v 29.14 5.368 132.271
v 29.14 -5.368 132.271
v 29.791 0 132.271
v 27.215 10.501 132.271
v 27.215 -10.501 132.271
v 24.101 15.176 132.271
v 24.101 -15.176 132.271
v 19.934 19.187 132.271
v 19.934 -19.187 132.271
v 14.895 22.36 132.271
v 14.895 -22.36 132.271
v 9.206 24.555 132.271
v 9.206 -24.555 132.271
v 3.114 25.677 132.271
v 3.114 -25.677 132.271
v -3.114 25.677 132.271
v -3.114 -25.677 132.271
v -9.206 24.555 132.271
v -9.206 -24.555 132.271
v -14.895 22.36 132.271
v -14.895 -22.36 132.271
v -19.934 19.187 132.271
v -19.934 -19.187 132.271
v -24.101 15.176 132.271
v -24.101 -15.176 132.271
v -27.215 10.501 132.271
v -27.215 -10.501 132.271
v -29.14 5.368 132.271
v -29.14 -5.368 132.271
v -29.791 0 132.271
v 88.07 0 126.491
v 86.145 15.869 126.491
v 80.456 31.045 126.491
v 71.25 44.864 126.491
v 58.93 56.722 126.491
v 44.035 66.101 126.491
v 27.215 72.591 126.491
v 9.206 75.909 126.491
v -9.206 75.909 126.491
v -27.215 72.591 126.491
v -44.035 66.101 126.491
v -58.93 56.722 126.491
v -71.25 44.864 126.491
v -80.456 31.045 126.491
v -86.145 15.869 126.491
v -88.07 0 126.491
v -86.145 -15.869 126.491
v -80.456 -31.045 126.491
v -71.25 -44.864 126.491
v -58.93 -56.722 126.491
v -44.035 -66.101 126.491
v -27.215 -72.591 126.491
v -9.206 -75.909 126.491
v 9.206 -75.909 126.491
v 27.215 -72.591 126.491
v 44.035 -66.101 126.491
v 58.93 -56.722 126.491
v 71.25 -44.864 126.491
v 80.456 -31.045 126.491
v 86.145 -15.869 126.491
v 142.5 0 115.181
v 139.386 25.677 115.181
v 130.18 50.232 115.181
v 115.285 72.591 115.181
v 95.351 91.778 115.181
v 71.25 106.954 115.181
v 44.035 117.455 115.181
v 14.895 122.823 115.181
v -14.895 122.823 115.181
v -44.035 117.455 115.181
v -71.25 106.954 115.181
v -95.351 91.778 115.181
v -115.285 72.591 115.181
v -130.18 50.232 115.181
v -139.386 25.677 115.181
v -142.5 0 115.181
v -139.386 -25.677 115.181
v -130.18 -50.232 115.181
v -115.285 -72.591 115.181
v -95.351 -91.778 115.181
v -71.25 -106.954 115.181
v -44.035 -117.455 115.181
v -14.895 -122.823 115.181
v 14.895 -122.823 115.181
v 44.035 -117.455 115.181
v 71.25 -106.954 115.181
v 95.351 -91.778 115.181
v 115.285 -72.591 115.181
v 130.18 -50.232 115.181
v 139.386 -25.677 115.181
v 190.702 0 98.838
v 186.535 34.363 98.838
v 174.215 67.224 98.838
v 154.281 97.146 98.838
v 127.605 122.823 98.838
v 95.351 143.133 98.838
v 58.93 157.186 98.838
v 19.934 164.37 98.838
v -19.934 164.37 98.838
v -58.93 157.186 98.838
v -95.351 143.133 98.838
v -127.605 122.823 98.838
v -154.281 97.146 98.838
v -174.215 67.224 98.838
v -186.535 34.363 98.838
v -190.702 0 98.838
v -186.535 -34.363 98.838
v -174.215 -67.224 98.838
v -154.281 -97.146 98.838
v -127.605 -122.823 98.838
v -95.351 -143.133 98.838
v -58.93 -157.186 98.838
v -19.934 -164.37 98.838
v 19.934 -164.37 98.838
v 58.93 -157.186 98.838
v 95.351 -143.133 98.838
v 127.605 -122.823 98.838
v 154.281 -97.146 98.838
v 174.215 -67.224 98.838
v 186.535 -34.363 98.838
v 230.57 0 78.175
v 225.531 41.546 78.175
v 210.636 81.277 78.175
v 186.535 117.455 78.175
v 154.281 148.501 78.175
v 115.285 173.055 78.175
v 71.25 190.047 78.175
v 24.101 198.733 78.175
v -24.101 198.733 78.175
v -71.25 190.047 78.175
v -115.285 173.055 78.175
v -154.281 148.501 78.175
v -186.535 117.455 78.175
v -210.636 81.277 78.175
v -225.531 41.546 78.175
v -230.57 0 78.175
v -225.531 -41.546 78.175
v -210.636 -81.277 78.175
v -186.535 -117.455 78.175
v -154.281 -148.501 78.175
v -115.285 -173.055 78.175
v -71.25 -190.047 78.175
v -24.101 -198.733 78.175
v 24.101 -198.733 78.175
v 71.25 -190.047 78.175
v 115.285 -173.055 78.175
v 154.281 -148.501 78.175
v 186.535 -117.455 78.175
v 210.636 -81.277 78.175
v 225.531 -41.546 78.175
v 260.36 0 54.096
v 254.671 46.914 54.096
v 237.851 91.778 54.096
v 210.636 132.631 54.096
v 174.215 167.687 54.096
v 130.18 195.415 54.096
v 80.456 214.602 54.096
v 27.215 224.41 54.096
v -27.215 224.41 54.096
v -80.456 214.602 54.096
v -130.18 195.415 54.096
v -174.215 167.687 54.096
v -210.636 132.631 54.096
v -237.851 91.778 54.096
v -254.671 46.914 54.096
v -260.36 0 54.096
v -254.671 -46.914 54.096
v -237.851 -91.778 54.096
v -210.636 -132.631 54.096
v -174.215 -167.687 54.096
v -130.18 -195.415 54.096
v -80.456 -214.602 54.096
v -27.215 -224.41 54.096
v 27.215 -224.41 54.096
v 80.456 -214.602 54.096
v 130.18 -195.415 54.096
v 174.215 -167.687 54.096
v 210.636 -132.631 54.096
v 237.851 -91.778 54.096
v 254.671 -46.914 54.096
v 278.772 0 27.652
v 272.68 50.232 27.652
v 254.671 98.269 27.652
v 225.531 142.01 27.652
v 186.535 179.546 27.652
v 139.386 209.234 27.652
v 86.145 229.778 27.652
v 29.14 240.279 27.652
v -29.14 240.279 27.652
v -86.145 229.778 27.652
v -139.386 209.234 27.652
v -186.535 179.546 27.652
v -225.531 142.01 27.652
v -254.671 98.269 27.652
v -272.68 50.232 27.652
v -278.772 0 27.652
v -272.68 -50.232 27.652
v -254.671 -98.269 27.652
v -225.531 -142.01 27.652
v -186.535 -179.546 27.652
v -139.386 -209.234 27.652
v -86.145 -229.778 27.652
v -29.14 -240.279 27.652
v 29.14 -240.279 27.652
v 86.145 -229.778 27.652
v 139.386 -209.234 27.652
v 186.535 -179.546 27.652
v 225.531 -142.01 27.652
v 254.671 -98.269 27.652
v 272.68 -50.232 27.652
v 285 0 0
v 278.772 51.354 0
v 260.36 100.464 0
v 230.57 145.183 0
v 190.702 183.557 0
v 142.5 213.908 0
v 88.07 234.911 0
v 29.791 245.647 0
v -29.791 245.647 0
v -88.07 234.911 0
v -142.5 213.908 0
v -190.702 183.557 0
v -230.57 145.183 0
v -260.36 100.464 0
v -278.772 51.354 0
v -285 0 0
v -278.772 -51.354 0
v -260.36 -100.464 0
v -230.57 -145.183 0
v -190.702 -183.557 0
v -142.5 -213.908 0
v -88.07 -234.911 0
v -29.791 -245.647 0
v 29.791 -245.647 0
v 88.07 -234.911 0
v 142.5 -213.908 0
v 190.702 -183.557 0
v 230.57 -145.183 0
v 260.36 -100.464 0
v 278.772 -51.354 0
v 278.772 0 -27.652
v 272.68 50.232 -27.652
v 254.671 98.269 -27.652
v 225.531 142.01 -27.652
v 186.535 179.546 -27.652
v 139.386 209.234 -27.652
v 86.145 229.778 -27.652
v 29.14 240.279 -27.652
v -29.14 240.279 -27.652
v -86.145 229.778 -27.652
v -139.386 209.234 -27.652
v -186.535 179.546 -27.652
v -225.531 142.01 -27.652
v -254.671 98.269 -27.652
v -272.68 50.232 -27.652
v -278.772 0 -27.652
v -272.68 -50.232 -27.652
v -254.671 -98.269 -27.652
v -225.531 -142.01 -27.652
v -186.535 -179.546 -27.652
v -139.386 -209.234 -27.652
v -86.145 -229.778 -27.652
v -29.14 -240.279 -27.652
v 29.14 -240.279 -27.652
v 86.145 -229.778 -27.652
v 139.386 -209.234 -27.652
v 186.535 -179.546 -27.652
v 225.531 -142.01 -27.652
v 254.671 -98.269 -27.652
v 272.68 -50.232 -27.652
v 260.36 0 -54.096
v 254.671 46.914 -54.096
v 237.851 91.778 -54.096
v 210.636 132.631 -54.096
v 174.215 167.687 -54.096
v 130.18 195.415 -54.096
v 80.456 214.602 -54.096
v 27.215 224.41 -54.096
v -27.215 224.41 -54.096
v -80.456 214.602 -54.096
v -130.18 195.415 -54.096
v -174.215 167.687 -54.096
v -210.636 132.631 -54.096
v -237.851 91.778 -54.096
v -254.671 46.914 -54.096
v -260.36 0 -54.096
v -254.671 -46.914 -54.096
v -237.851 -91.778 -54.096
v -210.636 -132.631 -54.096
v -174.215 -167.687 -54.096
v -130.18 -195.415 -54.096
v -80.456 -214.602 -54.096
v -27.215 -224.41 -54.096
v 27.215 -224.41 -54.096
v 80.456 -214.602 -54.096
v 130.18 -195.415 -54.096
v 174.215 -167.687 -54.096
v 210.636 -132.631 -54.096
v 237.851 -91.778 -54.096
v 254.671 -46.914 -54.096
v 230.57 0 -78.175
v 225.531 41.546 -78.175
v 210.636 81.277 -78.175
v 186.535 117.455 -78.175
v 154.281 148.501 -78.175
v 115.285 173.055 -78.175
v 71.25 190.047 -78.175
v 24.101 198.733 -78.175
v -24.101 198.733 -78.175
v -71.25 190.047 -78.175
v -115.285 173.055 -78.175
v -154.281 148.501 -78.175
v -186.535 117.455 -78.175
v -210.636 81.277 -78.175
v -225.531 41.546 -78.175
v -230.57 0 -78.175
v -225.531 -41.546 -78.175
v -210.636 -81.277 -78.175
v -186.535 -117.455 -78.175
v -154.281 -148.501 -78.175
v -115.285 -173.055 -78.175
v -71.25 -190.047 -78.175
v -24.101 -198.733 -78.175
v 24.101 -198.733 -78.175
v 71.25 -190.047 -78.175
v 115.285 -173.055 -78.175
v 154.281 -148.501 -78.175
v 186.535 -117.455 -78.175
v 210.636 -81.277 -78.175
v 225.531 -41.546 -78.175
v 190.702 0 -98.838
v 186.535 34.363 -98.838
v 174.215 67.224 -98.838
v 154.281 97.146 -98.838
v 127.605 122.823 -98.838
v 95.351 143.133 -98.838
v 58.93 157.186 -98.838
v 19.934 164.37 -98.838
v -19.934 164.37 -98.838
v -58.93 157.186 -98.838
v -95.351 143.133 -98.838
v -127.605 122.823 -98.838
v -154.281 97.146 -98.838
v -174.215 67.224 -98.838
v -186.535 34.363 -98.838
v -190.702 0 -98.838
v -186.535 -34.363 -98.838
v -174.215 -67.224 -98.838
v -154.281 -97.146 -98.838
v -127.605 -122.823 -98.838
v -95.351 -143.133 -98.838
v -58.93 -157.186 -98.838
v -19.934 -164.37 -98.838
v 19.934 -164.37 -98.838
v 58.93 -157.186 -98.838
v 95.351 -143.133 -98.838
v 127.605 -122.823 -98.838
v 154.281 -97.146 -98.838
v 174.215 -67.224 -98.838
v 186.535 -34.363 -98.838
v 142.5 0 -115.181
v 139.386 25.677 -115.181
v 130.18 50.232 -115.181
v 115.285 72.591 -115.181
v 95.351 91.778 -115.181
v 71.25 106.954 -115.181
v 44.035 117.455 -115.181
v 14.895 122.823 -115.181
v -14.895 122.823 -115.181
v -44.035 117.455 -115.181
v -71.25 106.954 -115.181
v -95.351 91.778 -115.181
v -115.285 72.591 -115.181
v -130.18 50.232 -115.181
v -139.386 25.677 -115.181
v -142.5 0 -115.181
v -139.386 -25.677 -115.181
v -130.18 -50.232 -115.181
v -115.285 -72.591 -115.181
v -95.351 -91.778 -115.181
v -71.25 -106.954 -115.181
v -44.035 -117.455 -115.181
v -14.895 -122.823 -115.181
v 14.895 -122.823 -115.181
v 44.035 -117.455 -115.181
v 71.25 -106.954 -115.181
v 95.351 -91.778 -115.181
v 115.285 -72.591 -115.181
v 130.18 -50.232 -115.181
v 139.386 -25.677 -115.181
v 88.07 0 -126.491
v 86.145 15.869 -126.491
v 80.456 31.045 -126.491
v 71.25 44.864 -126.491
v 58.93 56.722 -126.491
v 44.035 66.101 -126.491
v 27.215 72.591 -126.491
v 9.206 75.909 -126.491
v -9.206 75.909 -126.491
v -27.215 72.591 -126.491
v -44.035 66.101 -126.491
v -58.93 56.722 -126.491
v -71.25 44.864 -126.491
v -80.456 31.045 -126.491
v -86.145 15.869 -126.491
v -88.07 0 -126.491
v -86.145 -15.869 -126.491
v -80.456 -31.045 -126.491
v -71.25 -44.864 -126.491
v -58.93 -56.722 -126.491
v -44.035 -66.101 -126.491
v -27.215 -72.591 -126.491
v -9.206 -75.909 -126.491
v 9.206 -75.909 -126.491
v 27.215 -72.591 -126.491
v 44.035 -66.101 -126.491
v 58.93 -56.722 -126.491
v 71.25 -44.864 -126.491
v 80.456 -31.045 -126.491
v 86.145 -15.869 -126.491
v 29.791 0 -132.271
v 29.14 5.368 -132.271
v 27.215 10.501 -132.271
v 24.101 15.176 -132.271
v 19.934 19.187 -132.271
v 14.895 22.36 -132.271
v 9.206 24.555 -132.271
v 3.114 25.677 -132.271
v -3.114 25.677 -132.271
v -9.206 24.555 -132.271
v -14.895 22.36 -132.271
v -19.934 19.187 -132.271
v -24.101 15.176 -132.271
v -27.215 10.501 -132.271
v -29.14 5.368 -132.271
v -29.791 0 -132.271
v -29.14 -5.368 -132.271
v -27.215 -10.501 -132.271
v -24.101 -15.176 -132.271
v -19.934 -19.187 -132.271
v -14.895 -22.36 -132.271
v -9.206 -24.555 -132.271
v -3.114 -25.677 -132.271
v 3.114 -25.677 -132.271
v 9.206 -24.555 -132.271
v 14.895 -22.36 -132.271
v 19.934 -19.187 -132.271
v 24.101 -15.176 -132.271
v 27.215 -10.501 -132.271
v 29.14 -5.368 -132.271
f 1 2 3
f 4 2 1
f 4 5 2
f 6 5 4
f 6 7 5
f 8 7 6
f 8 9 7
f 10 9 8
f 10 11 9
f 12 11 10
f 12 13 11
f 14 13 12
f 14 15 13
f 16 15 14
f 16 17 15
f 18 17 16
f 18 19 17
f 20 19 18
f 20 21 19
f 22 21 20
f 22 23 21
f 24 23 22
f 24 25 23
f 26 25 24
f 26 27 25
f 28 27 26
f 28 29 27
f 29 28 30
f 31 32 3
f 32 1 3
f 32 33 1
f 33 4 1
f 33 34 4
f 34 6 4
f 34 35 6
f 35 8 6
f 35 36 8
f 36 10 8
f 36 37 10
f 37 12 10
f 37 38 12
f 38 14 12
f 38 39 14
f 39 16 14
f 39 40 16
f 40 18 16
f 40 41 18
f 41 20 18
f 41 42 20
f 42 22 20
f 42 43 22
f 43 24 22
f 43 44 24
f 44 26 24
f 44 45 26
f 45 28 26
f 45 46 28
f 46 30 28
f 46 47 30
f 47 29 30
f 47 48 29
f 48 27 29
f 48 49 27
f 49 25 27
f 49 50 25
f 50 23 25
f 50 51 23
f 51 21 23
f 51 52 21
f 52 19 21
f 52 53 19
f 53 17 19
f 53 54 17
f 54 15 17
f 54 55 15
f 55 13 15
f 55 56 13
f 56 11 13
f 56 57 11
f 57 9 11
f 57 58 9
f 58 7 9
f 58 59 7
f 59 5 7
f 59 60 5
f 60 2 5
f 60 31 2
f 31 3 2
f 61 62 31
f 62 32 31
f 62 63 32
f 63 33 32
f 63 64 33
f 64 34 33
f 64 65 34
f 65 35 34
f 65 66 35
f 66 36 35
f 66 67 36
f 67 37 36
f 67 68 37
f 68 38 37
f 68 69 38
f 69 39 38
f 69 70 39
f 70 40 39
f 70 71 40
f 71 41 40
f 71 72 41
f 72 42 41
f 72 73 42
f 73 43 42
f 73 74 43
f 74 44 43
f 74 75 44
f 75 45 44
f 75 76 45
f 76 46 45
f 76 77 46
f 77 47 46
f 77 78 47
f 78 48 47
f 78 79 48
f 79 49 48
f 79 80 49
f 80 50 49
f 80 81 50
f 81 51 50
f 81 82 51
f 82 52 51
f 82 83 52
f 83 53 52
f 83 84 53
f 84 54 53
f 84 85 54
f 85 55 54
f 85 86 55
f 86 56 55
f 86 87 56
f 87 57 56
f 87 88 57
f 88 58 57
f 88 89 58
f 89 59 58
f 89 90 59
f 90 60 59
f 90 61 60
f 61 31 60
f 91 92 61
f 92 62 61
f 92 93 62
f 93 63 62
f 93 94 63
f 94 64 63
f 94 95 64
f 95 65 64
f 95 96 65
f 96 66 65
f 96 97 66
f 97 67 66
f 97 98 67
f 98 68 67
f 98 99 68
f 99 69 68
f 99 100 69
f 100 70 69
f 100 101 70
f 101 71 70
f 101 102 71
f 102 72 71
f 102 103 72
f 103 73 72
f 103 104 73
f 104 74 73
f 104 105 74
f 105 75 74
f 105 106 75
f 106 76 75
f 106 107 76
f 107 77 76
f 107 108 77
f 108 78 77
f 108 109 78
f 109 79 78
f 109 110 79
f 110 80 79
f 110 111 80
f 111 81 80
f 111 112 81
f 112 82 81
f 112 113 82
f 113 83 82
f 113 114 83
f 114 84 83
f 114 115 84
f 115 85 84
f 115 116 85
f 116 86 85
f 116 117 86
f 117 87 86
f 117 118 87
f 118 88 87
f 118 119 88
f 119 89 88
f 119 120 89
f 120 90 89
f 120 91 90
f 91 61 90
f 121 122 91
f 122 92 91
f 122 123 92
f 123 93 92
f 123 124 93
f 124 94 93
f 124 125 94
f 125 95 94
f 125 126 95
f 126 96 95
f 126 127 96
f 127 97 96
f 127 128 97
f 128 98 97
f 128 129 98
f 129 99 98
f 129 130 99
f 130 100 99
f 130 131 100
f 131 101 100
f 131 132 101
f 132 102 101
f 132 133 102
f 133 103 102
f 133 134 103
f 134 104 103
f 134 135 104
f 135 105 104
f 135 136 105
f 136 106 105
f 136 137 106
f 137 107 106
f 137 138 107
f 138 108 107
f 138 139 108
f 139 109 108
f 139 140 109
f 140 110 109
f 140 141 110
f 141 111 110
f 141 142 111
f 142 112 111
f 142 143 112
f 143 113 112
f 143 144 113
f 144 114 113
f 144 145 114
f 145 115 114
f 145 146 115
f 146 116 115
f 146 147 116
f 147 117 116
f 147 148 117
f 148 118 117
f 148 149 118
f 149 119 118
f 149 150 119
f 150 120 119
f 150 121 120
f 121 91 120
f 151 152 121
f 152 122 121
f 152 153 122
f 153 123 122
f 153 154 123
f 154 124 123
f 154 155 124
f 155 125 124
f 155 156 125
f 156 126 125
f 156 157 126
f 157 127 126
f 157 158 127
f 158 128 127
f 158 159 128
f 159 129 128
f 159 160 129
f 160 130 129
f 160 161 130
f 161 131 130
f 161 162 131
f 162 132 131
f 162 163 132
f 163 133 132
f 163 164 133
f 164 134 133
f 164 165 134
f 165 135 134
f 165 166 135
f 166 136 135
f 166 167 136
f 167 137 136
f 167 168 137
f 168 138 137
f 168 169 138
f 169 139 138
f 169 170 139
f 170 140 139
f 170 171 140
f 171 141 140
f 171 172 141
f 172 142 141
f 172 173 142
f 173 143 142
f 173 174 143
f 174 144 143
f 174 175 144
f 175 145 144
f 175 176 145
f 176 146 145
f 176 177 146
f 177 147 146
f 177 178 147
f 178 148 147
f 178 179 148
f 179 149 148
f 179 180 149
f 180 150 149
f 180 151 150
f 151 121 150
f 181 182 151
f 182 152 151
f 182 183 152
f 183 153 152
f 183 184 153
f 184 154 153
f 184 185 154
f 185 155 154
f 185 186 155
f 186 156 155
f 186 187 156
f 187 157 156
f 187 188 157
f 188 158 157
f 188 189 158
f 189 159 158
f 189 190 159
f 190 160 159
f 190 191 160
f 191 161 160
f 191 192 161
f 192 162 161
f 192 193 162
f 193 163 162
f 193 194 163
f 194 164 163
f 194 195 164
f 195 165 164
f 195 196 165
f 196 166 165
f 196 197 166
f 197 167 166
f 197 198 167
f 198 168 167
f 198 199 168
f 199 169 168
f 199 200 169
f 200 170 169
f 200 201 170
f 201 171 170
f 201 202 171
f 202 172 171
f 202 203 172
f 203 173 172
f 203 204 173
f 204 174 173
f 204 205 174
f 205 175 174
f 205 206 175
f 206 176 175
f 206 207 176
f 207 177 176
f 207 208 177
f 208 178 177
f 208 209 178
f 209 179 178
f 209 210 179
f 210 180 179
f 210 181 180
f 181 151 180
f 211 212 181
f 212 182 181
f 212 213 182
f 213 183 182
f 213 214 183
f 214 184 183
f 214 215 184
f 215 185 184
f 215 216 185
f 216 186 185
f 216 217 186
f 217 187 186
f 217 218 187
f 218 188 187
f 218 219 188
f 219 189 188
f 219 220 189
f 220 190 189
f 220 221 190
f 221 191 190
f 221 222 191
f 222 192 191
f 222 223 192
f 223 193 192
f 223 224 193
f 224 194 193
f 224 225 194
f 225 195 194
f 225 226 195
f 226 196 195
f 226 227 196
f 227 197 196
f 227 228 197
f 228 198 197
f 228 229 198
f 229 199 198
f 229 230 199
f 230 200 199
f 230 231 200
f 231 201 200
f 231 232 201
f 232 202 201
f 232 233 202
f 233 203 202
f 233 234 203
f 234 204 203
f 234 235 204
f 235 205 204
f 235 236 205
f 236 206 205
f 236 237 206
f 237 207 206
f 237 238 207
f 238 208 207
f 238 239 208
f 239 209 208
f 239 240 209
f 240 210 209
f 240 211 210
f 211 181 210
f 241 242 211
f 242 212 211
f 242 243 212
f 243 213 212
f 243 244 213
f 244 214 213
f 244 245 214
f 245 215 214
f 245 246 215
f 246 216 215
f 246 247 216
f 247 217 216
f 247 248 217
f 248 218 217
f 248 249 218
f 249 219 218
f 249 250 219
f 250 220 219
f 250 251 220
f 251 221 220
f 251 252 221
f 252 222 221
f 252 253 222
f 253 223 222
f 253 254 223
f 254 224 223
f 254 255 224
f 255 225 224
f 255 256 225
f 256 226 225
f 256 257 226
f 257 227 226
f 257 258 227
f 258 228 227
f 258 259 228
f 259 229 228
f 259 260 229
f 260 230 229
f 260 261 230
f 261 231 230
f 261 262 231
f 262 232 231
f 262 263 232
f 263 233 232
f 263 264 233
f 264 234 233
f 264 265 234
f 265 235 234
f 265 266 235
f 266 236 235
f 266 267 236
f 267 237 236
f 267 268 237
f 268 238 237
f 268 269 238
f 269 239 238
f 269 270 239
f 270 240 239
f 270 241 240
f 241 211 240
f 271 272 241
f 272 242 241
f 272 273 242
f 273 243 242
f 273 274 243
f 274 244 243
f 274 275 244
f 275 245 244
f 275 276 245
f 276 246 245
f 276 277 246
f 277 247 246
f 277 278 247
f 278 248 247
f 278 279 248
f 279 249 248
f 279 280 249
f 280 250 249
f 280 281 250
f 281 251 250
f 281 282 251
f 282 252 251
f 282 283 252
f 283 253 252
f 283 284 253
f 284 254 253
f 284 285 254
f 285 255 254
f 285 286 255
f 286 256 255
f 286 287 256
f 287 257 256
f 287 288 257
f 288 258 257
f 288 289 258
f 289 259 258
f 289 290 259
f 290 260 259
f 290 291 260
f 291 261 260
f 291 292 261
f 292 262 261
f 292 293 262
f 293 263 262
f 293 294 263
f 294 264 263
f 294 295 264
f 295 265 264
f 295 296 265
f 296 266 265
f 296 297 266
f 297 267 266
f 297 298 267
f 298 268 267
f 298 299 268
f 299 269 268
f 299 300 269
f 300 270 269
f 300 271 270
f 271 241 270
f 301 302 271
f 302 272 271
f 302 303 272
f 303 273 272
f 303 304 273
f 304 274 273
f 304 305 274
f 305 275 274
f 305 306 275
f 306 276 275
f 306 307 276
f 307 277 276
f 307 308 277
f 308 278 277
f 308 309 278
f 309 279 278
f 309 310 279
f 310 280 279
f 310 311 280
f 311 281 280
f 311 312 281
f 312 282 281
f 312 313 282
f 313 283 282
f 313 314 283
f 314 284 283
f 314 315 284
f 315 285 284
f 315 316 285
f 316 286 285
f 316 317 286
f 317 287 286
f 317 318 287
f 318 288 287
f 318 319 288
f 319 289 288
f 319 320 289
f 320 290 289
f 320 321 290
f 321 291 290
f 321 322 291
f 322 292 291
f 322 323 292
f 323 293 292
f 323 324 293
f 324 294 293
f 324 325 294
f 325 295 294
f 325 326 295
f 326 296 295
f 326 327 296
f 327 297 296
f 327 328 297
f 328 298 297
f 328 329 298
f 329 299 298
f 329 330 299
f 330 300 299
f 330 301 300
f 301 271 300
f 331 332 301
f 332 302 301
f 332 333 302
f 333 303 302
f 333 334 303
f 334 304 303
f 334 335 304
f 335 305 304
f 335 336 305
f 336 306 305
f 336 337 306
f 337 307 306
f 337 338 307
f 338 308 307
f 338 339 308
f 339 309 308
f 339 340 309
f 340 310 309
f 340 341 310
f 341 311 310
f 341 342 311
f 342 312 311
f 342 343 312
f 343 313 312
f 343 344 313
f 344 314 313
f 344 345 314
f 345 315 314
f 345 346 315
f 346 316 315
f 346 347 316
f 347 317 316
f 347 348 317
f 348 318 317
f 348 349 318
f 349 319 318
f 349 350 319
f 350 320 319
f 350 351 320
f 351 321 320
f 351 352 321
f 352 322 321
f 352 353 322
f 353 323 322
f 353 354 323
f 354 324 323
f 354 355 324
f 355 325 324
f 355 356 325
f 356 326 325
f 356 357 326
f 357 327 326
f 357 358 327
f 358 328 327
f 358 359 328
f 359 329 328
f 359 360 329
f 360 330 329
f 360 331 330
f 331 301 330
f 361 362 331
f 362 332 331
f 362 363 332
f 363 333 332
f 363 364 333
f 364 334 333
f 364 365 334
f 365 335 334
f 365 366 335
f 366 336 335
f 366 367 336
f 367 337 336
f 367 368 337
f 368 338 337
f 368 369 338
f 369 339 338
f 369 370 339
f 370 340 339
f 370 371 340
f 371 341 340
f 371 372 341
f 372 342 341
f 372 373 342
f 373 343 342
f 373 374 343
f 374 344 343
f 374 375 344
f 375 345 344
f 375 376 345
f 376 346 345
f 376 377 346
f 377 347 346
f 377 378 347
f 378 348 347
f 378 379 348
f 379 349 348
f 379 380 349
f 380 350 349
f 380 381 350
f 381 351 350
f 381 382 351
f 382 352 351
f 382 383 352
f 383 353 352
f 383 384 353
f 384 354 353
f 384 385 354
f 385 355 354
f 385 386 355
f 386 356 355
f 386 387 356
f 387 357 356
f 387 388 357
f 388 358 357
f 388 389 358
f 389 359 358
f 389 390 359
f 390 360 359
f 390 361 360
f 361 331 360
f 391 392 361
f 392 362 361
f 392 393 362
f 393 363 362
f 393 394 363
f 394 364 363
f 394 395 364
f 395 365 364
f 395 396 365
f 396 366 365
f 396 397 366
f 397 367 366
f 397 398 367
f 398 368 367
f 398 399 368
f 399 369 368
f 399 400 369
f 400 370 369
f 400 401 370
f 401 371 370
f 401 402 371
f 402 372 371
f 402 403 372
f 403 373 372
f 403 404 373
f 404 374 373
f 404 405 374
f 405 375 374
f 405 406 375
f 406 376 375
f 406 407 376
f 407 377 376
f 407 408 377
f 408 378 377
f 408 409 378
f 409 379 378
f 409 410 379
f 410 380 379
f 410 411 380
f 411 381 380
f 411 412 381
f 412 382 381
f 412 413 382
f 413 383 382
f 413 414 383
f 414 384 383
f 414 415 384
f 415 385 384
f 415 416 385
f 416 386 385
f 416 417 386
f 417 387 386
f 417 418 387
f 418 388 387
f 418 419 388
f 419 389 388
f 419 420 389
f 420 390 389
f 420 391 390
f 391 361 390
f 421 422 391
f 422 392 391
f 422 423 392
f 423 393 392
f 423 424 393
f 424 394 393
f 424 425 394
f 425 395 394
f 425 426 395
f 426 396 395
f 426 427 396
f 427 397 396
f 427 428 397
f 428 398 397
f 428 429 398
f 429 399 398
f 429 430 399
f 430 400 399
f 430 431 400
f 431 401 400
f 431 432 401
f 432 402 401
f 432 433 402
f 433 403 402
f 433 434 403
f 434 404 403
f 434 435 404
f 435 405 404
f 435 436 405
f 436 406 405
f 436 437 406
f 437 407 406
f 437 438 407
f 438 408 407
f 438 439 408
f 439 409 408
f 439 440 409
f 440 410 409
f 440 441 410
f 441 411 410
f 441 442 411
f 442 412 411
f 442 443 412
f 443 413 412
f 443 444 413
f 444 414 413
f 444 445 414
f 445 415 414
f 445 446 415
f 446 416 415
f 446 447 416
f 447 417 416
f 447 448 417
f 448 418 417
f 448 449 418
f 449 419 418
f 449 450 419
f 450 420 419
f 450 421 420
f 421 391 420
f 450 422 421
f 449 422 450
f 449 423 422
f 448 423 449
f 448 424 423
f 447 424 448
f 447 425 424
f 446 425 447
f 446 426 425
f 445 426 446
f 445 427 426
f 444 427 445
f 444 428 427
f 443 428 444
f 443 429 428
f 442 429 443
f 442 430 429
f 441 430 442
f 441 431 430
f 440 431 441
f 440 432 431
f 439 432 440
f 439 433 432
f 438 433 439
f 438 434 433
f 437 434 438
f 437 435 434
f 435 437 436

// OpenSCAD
// Generated by SolidPython 1.0.1 on 2020-07-29 00:46:52


scale(v = [15, 13, 7]) {
	sphere(r = 19);
}
/***********************************************
*********      SolidPython code:      **********
************************************************
 
# import packages: SolidPython
from solid import *
from solid.utils import *
from itertools import chain, combinations, permutations


class Resize:

    def __init__(self, scad_file):
        self.scad_file = scad_file
        #self.scad_file = import_scad(scad_file)
        # cone/cylinder param:
        self.r1 = 0
        self.r2 = 0
        self.h = 0
        # rectangular prism param:
        self.w = 0
        self.l = 0
        # ellipse param:
        self.r = 0

    # import OpenScad code (file name corresponds to shape)


    # classify shape + parameters
    def assign(self, param1, param2, param3):
        if self.scad_file == 'cone.scad':
            self.r1 = param1
            self.r2 = param2
            self.h = param3
        elif self.scad_file == 'cylinder.scad':
            self.r1 = param1
            self.r2 = param2
            self.h = param3
        elif self.scad_file == 'rectangularPrism.scad':
            self.h = param1
            self.l = param2
            self.w = param3
        else:
            self.r = param1
            self.h = param2

    # resize parameters
    def iterate(self):
        x = range(3, 20, 2)
        i = 1
        if self.scad_file == 'cone.scad':
            tempList = list(permutations(x, 2))
            for temp in tempList:
                param1 = temp[0]
                param2 = temp[1]
                filepath = 'produced_scad_files/' + 'cone' + str(param1) + '_' + str(param2) + '_' + '.scad'
                scad_render_to_file(cylinder(h=param1, r1=param2, r2=0), filepath)

        elif self.scad_file == 'cylinder.scad':
            tempList = list(permutations(x, 3))
            for temp in tempList:
                param1 = temp[0]
                param2 = temp[1]
                filepath = 'produced_scad_files/' + 'cylinder' + str(param1) + '_' + str(param2) + '_' + '.scad'
                scad_render_to_file(cylinder(h=param1, r1=param2, r2=param2), filepath)

        elif self.scad_file == 'rectangularPrism.scad':
            tempList = list(permutations(x, 3))
            for temp in tempList:
                param1 = temp[0]
                param2 = temp[1]
                param3 = temp[2]
                filepath = 'produced_scad_files/' + 'rectangularPrism' + str(param1) + '_' + str(param2) + '_' + str(
                    param3) + '.scad'
                scad_render_to_file(cube(size=(param1, param2, param3)), filepath)

        elif self.scad_file == 'ellipse.scad':
            tempList = list(permutations(x, 4))
            for temp in tempList:
                param1 = temp[0]
                param2 = temp[1]
                param3 = temp[2]
                param4 = temp[3]
                filepath = 'produced_scad_files/' + 'ellipse' + str(param1) + '_' + str(param2) + '_' + str(param3) + '_' + str(param4) + '.scad'
                scad_render_to_file(scale([param1, param2, param3])(sphere(r=param4)), filepath)

    def render_to_scadfile(self):
        scad_render_to_file(scad, 'example.scad') 
 
************************************************/
